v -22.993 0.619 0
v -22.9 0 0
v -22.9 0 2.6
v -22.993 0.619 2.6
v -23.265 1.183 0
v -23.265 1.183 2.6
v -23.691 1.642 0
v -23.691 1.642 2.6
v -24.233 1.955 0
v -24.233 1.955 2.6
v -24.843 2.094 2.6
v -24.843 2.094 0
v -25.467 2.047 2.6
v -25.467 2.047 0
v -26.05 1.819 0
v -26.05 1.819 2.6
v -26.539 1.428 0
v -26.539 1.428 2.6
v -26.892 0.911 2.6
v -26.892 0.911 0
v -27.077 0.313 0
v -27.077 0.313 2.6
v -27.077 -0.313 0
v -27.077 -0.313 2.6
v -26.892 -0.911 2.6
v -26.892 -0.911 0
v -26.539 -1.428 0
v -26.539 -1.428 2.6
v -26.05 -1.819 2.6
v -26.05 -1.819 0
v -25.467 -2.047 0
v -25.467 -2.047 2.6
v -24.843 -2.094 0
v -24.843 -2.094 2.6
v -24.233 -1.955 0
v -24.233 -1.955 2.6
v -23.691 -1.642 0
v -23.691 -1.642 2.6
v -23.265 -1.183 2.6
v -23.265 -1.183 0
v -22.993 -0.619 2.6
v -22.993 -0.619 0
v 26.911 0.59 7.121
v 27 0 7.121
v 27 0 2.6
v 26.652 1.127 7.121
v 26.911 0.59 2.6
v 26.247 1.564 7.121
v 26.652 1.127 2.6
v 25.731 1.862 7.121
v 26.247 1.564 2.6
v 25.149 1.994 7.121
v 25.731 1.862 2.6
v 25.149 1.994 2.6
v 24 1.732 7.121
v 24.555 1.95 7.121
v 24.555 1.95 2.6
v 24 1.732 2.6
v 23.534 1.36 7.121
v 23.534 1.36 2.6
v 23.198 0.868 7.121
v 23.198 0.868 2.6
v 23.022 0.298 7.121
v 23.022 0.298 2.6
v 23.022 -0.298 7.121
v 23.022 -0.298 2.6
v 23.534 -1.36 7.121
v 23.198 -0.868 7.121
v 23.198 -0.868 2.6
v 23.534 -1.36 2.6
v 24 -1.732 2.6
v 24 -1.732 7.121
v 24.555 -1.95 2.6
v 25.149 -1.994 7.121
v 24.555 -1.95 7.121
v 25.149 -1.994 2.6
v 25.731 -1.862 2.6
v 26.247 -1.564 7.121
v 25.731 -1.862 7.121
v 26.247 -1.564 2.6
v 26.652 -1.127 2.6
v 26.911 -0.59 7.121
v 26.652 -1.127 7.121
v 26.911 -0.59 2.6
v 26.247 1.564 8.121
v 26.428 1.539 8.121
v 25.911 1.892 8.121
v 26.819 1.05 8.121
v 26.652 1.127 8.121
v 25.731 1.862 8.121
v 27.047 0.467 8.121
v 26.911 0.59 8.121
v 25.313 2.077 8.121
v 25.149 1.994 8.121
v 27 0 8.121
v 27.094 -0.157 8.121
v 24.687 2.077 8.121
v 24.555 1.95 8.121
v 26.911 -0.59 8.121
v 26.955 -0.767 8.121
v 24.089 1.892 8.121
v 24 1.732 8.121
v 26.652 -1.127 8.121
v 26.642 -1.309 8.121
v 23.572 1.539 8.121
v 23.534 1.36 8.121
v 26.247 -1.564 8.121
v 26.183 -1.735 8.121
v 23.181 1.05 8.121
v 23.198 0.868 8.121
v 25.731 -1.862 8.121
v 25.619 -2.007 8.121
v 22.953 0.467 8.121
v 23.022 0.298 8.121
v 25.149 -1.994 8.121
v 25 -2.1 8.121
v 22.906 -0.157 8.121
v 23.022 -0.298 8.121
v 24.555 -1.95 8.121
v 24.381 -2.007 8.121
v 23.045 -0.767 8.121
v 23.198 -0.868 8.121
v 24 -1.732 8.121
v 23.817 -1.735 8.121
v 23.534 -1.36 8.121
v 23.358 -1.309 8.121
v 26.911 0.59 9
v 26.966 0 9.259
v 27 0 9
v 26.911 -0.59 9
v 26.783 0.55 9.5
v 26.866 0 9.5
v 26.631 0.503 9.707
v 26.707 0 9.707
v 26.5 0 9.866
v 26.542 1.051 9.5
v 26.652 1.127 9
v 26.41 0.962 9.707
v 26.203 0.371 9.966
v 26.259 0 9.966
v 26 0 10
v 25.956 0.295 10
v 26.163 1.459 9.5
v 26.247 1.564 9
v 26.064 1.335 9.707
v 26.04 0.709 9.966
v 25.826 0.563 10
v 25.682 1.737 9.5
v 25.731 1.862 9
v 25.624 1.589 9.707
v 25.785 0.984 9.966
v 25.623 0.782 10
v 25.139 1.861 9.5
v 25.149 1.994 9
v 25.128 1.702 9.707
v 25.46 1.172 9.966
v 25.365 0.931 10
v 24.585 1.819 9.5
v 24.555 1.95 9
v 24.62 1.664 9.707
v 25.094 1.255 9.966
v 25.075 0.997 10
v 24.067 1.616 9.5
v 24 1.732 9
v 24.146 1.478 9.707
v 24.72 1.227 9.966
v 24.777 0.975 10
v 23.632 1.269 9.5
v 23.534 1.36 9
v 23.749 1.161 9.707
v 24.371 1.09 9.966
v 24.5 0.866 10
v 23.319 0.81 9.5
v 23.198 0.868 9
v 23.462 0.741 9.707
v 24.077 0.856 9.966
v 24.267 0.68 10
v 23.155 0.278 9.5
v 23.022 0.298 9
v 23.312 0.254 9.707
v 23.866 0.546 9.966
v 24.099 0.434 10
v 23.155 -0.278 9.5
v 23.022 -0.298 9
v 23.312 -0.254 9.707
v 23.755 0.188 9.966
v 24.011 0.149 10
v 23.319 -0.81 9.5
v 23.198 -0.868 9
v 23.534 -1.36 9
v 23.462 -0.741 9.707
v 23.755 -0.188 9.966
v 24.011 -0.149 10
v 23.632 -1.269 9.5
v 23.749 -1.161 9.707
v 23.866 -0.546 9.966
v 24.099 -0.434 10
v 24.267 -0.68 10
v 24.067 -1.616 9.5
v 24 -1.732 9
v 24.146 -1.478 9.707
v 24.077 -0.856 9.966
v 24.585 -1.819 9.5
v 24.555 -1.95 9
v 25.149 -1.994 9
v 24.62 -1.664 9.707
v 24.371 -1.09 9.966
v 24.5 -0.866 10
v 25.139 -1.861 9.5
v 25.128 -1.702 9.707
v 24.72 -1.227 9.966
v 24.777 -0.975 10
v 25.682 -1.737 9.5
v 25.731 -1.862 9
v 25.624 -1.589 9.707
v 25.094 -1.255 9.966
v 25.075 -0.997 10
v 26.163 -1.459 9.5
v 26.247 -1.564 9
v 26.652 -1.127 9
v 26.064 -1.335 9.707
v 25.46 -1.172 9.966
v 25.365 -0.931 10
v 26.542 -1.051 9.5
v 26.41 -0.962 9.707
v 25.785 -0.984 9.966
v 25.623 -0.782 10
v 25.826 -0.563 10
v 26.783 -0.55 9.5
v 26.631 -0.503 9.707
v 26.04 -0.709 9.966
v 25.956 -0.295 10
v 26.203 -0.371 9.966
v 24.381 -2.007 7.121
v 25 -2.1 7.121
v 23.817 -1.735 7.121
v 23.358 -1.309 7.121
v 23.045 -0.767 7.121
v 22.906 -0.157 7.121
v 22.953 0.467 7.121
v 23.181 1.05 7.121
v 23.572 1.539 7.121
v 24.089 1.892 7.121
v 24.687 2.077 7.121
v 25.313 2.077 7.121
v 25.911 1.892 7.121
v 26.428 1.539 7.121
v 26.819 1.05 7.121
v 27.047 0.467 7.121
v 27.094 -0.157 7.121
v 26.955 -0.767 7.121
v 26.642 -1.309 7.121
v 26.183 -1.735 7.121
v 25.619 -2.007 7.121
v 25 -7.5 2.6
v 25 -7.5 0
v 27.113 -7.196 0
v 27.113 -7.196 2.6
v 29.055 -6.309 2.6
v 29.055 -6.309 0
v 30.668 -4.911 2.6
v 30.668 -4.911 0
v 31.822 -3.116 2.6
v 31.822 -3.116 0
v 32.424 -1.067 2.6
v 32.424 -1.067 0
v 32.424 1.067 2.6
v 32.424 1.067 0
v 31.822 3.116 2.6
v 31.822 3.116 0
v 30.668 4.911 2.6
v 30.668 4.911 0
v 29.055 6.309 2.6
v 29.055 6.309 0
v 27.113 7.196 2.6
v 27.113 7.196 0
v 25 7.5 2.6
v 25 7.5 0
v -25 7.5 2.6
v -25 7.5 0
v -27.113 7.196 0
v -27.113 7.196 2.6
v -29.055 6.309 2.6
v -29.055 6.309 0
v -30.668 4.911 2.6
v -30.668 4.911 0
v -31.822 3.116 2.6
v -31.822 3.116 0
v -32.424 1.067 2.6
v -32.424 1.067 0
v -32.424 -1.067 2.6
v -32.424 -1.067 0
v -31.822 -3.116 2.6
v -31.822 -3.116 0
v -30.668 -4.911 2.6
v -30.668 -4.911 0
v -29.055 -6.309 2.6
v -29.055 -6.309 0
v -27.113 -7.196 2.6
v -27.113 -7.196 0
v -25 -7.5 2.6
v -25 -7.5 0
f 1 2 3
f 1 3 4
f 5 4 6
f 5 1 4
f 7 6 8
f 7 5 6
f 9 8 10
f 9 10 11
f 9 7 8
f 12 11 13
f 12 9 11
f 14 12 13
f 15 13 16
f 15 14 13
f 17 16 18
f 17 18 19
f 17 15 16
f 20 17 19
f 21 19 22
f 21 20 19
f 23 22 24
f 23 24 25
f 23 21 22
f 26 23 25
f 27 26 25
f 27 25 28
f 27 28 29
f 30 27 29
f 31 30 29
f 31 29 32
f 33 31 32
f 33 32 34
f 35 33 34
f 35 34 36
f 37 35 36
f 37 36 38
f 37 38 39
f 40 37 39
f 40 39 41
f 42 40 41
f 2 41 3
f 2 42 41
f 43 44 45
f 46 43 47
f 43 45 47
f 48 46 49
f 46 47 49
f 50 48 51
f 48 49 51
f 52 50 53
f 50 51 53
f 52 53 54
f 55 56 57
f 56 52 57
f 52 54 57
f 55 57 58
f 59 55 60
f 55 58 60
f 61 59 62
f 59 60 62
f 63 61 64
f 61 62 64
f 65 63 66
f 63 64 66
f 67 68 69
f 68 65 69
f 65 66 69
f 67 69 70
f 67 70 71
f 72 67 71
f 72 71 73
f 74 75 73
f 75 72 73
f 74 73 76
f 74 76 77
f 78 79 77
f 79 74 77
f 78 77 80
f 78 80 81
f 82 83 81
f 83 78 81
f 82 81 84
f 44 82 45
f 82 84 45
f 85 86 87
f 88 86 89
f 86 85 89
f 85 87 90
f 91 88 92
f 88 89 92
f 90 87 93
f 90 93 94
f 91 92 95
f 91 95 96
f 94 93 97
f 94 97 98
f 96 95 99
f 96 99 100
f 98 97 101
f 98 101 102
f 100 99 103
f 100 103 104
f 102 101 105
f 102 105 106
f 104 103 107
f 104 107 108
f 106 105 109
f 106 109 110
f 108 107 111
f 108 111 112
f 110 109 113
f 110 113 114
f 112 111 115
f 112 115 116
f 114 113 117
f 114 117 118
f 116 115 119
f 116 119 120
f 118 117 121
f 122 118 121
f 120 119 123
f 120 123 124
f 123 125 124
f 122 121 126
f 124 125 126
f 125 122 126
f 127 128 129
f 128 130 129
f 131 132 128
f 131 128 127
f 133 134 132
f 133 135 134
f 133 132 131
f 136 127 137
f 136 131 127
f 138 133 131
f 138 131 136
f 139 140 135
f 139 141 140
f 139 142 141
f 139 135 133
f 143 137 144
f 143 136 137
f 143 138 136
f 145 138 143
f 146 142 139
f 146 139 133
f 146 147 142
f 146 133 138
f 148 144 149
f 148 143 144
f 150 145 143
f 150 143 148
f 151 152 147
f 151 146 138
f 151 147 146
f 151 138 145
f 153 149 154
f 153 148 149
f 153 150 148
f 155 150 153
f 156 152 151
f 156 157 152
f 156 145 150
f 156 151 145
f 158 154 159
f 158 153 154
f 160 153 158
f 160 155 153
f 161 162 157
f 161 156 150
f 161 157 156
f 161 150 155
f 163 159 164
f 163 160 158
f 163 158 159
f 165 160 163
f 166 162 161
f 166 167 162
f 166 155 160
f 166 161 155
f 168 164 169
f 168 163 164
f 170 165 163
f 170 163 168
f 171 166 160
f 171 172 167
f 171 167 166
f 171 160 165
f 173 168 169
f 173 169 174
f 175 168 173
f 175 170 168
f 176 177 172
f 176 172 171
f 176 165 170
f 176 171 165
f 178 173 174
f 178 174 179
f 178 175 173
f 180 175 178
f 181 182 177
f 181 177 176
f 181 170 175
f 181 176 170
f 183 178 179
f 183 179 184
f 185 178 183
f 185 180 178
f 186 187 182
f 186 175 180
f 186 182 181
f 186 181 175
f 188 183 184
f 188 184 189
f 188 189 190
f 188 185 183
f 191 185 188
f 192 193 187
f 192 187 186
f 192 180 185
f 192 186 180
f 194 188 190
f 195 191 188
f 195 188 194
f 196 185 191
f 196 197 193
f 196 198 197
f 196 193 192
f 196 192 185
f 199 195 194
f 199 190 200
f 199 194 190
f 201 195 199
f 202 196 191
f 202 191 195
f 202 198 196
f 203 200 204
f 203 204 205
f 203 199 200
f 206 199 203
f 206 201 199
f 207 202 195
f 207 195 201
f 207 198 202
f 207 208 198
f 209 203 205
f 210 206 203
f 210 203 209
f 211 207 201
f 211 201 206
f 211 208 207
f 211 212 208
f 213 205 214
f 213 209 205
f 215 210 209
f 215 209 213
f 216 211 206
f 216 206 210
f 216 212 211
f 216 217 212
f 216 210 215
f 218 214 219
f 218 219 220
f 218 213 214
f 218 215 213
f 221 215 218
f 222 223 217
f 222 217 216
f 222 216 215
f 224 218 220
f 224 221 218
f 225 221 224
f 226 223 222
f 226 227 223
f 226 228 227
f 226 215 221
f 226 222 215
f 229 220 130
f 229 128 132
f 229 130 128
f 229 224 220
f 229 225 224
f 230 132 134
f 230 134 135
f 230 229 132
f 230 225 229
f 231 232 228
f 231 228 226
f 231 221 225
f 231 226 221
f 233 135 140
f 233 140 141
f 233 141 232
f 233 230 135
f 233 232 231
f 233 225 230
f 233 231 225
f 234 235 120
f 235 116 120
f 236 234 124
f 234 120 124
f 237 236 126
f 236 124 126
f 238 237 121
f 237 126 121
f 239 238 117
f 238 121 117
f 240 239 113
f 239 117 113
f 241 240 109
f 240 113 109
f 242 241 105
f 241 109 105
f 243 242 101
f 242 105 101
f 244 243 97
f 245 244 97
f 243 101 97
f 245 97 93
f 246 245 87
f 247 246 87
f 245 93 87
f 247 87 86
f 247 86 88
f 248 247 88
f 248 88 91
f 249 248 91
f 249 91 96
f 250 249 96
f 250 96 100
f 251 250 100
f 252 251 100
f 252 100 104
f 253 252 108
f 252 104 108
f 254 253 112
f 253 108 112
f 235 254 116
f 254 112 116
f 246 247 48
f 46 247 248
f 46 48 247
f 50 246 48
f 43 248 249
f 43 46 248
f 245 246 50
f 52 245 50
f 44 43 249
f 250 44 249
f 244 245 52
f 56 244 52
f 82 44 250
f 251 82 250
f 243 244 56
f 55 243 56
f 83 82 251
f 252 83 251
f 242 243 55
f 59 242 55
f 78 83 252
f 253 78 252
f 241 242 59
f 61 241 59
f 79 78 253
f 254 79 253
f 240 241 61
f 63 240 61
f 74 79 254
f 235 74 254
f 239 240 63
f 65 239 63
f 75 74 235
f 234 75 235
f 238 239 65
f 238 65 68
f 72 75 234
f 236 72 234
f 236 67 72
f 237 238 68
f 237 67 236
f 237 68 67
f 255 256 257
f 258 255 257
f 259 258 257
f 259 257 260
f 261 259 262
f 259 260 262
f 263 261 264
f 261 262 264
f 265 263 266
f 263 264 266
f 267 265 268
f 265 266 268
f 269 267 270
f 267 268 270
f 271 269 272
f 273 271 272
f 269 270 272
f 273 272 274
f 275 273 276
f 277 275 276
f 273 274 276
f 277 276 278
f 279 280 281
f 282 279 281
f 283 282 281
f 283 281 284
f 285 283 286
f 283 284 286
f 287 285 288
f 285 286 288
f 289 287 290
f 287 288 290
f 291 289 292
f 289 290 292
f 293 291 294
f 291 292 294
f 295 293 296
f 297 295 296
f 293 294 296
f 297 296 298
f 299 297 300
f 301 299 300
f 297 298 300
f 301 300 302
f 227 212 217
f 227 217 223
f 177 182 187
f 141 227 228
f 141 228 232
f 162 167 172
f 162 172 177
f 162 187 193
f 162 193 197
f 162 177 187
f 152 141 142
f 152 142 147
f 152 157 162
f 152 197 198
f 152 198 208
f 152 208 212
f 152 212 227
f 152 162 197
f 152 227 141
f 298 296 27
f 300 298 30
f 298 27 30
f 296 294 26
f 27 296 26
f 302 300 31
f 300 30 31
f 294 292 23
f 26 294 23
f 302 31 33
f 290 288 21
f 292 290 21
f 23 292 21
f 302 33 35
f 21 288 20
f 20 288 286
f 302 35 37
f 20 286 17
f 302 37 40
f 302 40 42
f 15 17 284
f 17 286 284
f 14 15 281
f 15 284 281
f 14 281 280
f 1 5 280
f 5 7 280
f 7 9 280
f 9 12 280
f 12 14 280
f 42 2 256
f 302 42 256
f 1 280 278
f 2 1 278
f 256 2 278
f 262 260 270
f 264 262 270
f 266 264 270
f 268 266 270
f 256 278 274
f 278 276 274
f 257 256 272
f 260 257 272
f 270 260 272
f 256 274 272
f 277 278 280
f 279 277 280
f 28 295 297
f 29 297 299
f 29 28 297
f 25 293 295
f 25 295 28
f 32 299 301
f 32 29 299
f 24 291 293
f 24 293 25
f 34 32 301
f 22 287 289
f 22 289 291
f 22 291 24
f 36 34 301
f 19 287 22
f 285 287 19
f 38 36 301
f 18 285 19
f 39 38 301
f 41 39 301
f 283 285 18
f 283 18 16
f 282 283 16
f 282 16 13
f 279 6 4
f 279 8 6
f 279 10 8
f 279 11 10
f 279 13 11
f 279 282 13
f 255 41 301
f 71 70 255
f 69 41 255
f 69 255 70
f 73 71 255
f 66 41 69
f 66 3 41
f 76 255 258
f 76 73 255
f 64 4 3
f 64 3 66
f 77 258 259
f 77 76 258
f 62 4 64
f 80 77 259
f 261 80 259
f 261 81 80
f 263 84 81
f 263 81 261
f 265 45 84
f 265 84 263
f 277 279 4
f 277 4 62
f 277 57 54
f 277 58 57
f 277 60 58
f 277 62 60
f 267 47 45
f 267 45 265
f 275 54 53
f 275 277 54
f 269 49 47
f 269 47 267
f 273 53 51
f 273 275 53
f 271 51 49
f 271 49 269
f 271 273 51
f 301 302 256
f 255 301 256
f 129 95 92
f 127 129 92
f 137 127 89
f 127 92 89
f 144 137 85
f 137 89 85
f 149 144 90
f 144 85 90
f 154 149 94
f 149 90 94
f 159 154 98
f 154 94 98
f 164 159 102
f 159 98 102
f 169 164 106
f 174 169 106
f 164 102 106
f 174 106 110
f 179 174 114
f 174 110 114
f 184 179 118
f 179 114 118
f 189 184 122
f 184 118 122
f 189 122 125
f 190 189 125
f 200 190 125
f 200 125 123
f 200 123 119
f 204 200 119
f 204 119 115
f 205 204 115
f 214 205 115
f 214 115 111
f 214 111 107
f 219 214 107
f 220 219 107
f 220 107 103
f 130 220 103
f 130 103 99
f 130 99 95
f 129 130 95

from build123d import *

# Parameters (mm, degrees)
F0_R     = 2
F1_DEPTH = 10
F0_R_2   = 2.1
F2_DEPTH = 2.6
F4_R     = 1
F5_W     = 2.1
F5_H     = 1


with BuildPart() as f1:
    # F0 (on Top) → F1 (new body)
    with BuildSketch(Plane.XY):
        with Locations((25, 0)):
            Circle(F0_R)
    extrude(amount=F1_DEPTH)

    # F0 (on Top) → F2 (join)
    with BuildSketch(Plane.XY):
        with BuildLine():
            Line((25, 7.5), (-25, 7.5))
            ThreePointArc((-25, 7.5), (-32.5, 0), (-25, -7.5))
            Line((-25, -7.5), (25, -7.5))
            ThreePointArc((25, -7.5), (32.5, 0), (25, 7.5))
        make_face()
        with Locations((-25, 0)):
            Circle(F0_R_2, mode=Mode.SUBTRACT)
        with Locations((25, 0)):
            Circle(F0_R, mode=Mode.SUBTRACT)
    extrude(amount=F2_DEPTH)

    # F4
    f4_edges = [f1.edges().sort_by_distance(p)[0] for p in [
        (23, 0, 10),
    ]]
    fillet(f4_edges, radius=F4_R)

    # F5 (on offset) → F6 (revolve)
    with BuildSketch(Plane.YZ.offset(25)):
        with Locations((-1.05, 7.6208)):
            Rectangle(F5_W, F5_H)
    revolve(axis=Axis((25, 0, 7.6208), (0, 0, -1)))


solid = f1.part
